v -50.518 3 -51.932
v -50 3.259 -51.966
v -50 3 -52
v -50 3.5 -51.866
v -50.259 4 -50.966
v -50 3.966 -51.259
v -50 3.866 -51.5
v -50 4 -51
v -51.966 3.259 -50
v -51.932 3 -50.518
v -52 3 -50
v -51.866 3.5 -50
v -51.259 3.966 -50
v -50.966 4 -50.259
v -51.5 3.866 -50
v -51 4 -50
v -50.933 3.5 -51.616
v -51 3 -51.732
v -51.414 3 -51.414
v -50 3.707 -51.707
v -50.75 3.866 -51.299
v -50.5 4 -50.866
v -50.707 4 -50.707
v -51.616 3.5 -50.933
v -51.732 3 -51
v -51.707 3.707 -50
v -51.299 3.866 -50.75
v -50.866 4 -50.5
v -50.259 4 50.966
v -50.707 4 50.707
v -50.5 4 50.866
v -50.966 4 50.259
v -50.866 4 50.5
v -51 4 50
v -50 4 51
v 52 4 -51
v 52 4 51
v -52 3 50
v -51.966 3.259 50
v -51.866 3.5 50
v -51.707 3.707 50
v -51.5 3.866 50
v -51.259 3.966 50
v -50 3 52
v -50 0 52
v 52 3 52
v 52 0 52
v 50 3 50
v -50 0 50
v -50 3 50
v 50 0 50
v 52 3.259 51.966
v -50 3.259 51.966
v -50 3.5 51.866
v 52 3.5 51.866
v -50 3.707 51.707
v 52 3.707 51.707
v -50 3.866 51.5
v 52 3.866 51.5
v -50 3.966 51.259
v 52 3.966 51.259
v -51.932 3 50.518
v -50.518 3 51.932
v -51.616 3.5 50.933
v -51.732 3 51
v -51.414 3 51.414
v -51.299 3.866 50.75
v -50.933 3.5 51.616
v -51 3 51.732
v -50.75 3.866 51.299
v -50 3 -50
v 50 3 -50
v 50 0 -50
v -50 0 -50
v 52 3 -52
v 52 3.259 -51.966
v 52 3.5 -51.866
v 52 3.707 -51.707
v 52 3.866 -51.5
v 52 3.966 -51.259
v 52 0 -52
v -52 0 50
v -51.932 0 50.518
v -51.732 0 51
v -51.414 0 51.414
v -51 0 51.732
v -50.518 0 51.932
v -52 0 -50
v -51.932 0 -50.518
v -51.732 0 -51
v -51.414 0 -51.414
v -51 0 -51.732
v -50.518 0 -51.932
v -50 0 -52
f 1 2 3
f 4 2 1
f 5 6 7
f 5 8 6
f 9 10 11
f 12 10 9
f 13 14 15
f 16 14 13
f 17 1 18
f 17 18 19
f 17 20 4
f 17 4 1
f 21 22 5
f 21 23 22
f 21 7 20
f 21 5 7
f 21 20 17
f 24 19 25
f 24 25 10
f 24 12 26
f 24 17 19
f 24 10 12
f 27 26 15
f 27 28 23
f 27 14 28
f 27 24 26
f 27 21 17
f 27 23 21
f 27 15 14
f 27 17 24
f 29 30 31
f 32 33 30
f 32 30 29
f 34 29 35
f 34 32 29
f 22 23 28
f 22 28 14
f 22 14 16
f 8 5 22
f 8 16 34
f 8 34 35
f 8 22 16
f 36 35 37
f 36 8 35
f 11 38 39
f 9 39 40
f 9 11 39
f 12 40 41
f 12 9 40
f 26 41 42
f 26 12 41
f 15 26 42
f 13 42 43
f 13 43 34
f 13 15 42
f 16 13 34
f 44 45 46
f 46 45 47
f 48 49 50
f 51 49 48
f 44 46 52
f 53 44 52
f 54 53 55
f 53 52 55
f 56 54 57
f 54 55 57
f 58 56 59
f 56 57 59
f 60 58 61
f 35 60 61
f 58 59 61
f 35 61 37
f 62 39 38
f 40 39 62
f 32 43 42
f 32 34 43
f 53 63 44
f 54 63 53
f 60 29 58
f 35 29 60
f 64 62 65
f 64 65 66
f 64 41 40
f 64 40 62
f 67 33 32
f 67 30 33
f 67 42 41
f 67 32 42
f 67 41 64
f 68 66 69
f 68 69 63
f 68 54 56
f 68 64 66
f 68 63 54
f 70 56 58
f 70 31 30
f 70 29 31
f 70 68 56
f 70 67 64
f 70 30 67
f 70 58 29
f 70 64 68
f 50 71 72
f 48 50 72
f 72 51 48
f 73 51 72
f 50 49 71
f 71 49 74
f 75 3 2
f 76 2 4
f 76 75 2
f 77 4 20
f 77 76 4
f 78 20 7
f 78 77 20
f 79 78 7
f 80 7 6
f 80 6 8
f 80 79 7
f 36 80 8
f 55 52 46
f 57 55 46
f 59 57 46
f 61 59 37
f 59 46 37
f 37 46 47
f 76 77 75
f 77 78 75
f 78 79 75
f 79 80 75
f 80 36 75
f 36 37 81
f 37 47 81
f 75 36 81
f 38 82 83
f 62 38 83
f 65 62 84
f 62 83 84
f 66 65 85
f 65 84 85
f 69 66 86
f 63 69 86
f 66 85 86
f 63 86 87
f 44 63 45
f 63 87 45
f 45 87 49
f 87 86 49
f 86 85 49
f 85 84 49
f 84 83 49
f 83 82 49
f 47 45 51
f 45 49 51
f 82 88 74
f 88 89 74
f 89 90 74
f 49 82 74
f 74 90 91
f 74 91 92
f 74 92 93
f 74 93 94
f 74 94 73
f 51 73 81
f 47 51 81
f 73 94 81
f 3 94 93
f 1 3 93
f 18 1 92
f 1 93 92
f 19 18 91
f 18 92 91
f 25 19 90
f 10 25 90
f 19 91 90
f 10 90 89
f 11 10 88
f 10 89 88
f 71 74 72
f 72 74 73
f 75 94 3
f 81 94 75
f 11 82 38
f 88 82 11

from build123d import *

# Parameters (mm, degrees)
SCHIZZO1_W                   = 104
SCHIZZO1_H                   = 104
ESTRUSIONE_ESTRUSIONE1_DEPTH = 4
SCHIZZO2_W                   = 100
SCHIZZO2_H                   = 100
TAGLIO_ESTRUSIONE2_DEPTH     = 3
RACCORDO1_R                  = 1
RACCORDO2_R                  = 2


with BuildPart() as part:
    # Schizzo1 → Estrusione-Estrusione1 (new body)
    with BuildSketch(Plane(origin=(0, 0, 0), x_dir=(1, 0, 0), z_dir=(0, 1, 0))):
        Rectangle(SCHIZZO1_W, SCHIZZO1_H)
    extrude(amount=ESTRUSIONE_ESTRUSIONE1_DEPTH)

    # Schizzo2 → Taglio-Estrusione2 (cut)
    with BuildSketch(Plane(origin=(0, 0, 0), x_dir=(1, 0, 0), z_dir=(0, 1, 0))):
        Rectangle(SCHIZZO2_W, SCHIZZO2_H)
    extrude(amount=TAGLIO_ESTRUSIONE2_DEPTH, mode=Mode.SUBTRACT)

    # Raccordo1
    raccordo1_edges = [part.edges().sort_by_distance(p)[0] for p in [
        (0, 4, -52),
        (-52, 4, 0),
        (0, 4, 52),
    ]]
    fillet(raccordo1_edges, radius=RACCORDO1_R)

    # Raccordo2
    # the kernel refuses this fillet: 2 mm, written as the material it takes off along each edge
    with BuildSketch(Plane(origin=(-50, 4, -50), x_dir=(0, 0, -1), z_dir=(1, 0, 0))) as raccordo2_piece_1:
        with BuildLine():
            CenterArc((1, -1), 1, 0, 90)
            Line((2, -1), (2, 0))
            Line((2, 0), (1, 0))
        make_face()
    revolve(axis=Axis((-50, 4, -50), (0, 1, 0)), revolution_arc=90, mode=Mode.SUBTRACT)
    with BuildSketch(Plane(origin=(-50, 4, 50), x_dir=(-1, 0, 0), z_dir=(0, 0, -1))) as raccordo2_piece_2:
        with BuildLine():
            CenterArc((1, -1), 1, 0, 90)
            Line((2, -1), (2, 0))
            Line((2, 0), (1, 0))
        make_face()
    revolve(axis=Axis((-50, 4, 50), (0, 1, 0)), revolution_arc=90, mode=Mode.SUBTRACT)
    with BuildSketch(Plane(origin=(-52, -5, 52), x_dir=(1, 0, 0), z_dir=(0, 1, 0)), Plane(origin=(-52, -5, -52), x_dir=(0, 0, 1), z_dir=(0, 1, 0))) as raccordo2_piece_3:
        with BuildLine():
            CenterArc((RACCORDO2_R, RACCORDO2_R), RACCORDO2_R, 180, 90)
            Line((0, RACCORDO2_R), (0, 0))
            Line((0, 0), (RACCORDO2_R, 0))
        make_face()
    extrude(amount=9, mode=Mode.SUBTRACT)


solid = part.part
